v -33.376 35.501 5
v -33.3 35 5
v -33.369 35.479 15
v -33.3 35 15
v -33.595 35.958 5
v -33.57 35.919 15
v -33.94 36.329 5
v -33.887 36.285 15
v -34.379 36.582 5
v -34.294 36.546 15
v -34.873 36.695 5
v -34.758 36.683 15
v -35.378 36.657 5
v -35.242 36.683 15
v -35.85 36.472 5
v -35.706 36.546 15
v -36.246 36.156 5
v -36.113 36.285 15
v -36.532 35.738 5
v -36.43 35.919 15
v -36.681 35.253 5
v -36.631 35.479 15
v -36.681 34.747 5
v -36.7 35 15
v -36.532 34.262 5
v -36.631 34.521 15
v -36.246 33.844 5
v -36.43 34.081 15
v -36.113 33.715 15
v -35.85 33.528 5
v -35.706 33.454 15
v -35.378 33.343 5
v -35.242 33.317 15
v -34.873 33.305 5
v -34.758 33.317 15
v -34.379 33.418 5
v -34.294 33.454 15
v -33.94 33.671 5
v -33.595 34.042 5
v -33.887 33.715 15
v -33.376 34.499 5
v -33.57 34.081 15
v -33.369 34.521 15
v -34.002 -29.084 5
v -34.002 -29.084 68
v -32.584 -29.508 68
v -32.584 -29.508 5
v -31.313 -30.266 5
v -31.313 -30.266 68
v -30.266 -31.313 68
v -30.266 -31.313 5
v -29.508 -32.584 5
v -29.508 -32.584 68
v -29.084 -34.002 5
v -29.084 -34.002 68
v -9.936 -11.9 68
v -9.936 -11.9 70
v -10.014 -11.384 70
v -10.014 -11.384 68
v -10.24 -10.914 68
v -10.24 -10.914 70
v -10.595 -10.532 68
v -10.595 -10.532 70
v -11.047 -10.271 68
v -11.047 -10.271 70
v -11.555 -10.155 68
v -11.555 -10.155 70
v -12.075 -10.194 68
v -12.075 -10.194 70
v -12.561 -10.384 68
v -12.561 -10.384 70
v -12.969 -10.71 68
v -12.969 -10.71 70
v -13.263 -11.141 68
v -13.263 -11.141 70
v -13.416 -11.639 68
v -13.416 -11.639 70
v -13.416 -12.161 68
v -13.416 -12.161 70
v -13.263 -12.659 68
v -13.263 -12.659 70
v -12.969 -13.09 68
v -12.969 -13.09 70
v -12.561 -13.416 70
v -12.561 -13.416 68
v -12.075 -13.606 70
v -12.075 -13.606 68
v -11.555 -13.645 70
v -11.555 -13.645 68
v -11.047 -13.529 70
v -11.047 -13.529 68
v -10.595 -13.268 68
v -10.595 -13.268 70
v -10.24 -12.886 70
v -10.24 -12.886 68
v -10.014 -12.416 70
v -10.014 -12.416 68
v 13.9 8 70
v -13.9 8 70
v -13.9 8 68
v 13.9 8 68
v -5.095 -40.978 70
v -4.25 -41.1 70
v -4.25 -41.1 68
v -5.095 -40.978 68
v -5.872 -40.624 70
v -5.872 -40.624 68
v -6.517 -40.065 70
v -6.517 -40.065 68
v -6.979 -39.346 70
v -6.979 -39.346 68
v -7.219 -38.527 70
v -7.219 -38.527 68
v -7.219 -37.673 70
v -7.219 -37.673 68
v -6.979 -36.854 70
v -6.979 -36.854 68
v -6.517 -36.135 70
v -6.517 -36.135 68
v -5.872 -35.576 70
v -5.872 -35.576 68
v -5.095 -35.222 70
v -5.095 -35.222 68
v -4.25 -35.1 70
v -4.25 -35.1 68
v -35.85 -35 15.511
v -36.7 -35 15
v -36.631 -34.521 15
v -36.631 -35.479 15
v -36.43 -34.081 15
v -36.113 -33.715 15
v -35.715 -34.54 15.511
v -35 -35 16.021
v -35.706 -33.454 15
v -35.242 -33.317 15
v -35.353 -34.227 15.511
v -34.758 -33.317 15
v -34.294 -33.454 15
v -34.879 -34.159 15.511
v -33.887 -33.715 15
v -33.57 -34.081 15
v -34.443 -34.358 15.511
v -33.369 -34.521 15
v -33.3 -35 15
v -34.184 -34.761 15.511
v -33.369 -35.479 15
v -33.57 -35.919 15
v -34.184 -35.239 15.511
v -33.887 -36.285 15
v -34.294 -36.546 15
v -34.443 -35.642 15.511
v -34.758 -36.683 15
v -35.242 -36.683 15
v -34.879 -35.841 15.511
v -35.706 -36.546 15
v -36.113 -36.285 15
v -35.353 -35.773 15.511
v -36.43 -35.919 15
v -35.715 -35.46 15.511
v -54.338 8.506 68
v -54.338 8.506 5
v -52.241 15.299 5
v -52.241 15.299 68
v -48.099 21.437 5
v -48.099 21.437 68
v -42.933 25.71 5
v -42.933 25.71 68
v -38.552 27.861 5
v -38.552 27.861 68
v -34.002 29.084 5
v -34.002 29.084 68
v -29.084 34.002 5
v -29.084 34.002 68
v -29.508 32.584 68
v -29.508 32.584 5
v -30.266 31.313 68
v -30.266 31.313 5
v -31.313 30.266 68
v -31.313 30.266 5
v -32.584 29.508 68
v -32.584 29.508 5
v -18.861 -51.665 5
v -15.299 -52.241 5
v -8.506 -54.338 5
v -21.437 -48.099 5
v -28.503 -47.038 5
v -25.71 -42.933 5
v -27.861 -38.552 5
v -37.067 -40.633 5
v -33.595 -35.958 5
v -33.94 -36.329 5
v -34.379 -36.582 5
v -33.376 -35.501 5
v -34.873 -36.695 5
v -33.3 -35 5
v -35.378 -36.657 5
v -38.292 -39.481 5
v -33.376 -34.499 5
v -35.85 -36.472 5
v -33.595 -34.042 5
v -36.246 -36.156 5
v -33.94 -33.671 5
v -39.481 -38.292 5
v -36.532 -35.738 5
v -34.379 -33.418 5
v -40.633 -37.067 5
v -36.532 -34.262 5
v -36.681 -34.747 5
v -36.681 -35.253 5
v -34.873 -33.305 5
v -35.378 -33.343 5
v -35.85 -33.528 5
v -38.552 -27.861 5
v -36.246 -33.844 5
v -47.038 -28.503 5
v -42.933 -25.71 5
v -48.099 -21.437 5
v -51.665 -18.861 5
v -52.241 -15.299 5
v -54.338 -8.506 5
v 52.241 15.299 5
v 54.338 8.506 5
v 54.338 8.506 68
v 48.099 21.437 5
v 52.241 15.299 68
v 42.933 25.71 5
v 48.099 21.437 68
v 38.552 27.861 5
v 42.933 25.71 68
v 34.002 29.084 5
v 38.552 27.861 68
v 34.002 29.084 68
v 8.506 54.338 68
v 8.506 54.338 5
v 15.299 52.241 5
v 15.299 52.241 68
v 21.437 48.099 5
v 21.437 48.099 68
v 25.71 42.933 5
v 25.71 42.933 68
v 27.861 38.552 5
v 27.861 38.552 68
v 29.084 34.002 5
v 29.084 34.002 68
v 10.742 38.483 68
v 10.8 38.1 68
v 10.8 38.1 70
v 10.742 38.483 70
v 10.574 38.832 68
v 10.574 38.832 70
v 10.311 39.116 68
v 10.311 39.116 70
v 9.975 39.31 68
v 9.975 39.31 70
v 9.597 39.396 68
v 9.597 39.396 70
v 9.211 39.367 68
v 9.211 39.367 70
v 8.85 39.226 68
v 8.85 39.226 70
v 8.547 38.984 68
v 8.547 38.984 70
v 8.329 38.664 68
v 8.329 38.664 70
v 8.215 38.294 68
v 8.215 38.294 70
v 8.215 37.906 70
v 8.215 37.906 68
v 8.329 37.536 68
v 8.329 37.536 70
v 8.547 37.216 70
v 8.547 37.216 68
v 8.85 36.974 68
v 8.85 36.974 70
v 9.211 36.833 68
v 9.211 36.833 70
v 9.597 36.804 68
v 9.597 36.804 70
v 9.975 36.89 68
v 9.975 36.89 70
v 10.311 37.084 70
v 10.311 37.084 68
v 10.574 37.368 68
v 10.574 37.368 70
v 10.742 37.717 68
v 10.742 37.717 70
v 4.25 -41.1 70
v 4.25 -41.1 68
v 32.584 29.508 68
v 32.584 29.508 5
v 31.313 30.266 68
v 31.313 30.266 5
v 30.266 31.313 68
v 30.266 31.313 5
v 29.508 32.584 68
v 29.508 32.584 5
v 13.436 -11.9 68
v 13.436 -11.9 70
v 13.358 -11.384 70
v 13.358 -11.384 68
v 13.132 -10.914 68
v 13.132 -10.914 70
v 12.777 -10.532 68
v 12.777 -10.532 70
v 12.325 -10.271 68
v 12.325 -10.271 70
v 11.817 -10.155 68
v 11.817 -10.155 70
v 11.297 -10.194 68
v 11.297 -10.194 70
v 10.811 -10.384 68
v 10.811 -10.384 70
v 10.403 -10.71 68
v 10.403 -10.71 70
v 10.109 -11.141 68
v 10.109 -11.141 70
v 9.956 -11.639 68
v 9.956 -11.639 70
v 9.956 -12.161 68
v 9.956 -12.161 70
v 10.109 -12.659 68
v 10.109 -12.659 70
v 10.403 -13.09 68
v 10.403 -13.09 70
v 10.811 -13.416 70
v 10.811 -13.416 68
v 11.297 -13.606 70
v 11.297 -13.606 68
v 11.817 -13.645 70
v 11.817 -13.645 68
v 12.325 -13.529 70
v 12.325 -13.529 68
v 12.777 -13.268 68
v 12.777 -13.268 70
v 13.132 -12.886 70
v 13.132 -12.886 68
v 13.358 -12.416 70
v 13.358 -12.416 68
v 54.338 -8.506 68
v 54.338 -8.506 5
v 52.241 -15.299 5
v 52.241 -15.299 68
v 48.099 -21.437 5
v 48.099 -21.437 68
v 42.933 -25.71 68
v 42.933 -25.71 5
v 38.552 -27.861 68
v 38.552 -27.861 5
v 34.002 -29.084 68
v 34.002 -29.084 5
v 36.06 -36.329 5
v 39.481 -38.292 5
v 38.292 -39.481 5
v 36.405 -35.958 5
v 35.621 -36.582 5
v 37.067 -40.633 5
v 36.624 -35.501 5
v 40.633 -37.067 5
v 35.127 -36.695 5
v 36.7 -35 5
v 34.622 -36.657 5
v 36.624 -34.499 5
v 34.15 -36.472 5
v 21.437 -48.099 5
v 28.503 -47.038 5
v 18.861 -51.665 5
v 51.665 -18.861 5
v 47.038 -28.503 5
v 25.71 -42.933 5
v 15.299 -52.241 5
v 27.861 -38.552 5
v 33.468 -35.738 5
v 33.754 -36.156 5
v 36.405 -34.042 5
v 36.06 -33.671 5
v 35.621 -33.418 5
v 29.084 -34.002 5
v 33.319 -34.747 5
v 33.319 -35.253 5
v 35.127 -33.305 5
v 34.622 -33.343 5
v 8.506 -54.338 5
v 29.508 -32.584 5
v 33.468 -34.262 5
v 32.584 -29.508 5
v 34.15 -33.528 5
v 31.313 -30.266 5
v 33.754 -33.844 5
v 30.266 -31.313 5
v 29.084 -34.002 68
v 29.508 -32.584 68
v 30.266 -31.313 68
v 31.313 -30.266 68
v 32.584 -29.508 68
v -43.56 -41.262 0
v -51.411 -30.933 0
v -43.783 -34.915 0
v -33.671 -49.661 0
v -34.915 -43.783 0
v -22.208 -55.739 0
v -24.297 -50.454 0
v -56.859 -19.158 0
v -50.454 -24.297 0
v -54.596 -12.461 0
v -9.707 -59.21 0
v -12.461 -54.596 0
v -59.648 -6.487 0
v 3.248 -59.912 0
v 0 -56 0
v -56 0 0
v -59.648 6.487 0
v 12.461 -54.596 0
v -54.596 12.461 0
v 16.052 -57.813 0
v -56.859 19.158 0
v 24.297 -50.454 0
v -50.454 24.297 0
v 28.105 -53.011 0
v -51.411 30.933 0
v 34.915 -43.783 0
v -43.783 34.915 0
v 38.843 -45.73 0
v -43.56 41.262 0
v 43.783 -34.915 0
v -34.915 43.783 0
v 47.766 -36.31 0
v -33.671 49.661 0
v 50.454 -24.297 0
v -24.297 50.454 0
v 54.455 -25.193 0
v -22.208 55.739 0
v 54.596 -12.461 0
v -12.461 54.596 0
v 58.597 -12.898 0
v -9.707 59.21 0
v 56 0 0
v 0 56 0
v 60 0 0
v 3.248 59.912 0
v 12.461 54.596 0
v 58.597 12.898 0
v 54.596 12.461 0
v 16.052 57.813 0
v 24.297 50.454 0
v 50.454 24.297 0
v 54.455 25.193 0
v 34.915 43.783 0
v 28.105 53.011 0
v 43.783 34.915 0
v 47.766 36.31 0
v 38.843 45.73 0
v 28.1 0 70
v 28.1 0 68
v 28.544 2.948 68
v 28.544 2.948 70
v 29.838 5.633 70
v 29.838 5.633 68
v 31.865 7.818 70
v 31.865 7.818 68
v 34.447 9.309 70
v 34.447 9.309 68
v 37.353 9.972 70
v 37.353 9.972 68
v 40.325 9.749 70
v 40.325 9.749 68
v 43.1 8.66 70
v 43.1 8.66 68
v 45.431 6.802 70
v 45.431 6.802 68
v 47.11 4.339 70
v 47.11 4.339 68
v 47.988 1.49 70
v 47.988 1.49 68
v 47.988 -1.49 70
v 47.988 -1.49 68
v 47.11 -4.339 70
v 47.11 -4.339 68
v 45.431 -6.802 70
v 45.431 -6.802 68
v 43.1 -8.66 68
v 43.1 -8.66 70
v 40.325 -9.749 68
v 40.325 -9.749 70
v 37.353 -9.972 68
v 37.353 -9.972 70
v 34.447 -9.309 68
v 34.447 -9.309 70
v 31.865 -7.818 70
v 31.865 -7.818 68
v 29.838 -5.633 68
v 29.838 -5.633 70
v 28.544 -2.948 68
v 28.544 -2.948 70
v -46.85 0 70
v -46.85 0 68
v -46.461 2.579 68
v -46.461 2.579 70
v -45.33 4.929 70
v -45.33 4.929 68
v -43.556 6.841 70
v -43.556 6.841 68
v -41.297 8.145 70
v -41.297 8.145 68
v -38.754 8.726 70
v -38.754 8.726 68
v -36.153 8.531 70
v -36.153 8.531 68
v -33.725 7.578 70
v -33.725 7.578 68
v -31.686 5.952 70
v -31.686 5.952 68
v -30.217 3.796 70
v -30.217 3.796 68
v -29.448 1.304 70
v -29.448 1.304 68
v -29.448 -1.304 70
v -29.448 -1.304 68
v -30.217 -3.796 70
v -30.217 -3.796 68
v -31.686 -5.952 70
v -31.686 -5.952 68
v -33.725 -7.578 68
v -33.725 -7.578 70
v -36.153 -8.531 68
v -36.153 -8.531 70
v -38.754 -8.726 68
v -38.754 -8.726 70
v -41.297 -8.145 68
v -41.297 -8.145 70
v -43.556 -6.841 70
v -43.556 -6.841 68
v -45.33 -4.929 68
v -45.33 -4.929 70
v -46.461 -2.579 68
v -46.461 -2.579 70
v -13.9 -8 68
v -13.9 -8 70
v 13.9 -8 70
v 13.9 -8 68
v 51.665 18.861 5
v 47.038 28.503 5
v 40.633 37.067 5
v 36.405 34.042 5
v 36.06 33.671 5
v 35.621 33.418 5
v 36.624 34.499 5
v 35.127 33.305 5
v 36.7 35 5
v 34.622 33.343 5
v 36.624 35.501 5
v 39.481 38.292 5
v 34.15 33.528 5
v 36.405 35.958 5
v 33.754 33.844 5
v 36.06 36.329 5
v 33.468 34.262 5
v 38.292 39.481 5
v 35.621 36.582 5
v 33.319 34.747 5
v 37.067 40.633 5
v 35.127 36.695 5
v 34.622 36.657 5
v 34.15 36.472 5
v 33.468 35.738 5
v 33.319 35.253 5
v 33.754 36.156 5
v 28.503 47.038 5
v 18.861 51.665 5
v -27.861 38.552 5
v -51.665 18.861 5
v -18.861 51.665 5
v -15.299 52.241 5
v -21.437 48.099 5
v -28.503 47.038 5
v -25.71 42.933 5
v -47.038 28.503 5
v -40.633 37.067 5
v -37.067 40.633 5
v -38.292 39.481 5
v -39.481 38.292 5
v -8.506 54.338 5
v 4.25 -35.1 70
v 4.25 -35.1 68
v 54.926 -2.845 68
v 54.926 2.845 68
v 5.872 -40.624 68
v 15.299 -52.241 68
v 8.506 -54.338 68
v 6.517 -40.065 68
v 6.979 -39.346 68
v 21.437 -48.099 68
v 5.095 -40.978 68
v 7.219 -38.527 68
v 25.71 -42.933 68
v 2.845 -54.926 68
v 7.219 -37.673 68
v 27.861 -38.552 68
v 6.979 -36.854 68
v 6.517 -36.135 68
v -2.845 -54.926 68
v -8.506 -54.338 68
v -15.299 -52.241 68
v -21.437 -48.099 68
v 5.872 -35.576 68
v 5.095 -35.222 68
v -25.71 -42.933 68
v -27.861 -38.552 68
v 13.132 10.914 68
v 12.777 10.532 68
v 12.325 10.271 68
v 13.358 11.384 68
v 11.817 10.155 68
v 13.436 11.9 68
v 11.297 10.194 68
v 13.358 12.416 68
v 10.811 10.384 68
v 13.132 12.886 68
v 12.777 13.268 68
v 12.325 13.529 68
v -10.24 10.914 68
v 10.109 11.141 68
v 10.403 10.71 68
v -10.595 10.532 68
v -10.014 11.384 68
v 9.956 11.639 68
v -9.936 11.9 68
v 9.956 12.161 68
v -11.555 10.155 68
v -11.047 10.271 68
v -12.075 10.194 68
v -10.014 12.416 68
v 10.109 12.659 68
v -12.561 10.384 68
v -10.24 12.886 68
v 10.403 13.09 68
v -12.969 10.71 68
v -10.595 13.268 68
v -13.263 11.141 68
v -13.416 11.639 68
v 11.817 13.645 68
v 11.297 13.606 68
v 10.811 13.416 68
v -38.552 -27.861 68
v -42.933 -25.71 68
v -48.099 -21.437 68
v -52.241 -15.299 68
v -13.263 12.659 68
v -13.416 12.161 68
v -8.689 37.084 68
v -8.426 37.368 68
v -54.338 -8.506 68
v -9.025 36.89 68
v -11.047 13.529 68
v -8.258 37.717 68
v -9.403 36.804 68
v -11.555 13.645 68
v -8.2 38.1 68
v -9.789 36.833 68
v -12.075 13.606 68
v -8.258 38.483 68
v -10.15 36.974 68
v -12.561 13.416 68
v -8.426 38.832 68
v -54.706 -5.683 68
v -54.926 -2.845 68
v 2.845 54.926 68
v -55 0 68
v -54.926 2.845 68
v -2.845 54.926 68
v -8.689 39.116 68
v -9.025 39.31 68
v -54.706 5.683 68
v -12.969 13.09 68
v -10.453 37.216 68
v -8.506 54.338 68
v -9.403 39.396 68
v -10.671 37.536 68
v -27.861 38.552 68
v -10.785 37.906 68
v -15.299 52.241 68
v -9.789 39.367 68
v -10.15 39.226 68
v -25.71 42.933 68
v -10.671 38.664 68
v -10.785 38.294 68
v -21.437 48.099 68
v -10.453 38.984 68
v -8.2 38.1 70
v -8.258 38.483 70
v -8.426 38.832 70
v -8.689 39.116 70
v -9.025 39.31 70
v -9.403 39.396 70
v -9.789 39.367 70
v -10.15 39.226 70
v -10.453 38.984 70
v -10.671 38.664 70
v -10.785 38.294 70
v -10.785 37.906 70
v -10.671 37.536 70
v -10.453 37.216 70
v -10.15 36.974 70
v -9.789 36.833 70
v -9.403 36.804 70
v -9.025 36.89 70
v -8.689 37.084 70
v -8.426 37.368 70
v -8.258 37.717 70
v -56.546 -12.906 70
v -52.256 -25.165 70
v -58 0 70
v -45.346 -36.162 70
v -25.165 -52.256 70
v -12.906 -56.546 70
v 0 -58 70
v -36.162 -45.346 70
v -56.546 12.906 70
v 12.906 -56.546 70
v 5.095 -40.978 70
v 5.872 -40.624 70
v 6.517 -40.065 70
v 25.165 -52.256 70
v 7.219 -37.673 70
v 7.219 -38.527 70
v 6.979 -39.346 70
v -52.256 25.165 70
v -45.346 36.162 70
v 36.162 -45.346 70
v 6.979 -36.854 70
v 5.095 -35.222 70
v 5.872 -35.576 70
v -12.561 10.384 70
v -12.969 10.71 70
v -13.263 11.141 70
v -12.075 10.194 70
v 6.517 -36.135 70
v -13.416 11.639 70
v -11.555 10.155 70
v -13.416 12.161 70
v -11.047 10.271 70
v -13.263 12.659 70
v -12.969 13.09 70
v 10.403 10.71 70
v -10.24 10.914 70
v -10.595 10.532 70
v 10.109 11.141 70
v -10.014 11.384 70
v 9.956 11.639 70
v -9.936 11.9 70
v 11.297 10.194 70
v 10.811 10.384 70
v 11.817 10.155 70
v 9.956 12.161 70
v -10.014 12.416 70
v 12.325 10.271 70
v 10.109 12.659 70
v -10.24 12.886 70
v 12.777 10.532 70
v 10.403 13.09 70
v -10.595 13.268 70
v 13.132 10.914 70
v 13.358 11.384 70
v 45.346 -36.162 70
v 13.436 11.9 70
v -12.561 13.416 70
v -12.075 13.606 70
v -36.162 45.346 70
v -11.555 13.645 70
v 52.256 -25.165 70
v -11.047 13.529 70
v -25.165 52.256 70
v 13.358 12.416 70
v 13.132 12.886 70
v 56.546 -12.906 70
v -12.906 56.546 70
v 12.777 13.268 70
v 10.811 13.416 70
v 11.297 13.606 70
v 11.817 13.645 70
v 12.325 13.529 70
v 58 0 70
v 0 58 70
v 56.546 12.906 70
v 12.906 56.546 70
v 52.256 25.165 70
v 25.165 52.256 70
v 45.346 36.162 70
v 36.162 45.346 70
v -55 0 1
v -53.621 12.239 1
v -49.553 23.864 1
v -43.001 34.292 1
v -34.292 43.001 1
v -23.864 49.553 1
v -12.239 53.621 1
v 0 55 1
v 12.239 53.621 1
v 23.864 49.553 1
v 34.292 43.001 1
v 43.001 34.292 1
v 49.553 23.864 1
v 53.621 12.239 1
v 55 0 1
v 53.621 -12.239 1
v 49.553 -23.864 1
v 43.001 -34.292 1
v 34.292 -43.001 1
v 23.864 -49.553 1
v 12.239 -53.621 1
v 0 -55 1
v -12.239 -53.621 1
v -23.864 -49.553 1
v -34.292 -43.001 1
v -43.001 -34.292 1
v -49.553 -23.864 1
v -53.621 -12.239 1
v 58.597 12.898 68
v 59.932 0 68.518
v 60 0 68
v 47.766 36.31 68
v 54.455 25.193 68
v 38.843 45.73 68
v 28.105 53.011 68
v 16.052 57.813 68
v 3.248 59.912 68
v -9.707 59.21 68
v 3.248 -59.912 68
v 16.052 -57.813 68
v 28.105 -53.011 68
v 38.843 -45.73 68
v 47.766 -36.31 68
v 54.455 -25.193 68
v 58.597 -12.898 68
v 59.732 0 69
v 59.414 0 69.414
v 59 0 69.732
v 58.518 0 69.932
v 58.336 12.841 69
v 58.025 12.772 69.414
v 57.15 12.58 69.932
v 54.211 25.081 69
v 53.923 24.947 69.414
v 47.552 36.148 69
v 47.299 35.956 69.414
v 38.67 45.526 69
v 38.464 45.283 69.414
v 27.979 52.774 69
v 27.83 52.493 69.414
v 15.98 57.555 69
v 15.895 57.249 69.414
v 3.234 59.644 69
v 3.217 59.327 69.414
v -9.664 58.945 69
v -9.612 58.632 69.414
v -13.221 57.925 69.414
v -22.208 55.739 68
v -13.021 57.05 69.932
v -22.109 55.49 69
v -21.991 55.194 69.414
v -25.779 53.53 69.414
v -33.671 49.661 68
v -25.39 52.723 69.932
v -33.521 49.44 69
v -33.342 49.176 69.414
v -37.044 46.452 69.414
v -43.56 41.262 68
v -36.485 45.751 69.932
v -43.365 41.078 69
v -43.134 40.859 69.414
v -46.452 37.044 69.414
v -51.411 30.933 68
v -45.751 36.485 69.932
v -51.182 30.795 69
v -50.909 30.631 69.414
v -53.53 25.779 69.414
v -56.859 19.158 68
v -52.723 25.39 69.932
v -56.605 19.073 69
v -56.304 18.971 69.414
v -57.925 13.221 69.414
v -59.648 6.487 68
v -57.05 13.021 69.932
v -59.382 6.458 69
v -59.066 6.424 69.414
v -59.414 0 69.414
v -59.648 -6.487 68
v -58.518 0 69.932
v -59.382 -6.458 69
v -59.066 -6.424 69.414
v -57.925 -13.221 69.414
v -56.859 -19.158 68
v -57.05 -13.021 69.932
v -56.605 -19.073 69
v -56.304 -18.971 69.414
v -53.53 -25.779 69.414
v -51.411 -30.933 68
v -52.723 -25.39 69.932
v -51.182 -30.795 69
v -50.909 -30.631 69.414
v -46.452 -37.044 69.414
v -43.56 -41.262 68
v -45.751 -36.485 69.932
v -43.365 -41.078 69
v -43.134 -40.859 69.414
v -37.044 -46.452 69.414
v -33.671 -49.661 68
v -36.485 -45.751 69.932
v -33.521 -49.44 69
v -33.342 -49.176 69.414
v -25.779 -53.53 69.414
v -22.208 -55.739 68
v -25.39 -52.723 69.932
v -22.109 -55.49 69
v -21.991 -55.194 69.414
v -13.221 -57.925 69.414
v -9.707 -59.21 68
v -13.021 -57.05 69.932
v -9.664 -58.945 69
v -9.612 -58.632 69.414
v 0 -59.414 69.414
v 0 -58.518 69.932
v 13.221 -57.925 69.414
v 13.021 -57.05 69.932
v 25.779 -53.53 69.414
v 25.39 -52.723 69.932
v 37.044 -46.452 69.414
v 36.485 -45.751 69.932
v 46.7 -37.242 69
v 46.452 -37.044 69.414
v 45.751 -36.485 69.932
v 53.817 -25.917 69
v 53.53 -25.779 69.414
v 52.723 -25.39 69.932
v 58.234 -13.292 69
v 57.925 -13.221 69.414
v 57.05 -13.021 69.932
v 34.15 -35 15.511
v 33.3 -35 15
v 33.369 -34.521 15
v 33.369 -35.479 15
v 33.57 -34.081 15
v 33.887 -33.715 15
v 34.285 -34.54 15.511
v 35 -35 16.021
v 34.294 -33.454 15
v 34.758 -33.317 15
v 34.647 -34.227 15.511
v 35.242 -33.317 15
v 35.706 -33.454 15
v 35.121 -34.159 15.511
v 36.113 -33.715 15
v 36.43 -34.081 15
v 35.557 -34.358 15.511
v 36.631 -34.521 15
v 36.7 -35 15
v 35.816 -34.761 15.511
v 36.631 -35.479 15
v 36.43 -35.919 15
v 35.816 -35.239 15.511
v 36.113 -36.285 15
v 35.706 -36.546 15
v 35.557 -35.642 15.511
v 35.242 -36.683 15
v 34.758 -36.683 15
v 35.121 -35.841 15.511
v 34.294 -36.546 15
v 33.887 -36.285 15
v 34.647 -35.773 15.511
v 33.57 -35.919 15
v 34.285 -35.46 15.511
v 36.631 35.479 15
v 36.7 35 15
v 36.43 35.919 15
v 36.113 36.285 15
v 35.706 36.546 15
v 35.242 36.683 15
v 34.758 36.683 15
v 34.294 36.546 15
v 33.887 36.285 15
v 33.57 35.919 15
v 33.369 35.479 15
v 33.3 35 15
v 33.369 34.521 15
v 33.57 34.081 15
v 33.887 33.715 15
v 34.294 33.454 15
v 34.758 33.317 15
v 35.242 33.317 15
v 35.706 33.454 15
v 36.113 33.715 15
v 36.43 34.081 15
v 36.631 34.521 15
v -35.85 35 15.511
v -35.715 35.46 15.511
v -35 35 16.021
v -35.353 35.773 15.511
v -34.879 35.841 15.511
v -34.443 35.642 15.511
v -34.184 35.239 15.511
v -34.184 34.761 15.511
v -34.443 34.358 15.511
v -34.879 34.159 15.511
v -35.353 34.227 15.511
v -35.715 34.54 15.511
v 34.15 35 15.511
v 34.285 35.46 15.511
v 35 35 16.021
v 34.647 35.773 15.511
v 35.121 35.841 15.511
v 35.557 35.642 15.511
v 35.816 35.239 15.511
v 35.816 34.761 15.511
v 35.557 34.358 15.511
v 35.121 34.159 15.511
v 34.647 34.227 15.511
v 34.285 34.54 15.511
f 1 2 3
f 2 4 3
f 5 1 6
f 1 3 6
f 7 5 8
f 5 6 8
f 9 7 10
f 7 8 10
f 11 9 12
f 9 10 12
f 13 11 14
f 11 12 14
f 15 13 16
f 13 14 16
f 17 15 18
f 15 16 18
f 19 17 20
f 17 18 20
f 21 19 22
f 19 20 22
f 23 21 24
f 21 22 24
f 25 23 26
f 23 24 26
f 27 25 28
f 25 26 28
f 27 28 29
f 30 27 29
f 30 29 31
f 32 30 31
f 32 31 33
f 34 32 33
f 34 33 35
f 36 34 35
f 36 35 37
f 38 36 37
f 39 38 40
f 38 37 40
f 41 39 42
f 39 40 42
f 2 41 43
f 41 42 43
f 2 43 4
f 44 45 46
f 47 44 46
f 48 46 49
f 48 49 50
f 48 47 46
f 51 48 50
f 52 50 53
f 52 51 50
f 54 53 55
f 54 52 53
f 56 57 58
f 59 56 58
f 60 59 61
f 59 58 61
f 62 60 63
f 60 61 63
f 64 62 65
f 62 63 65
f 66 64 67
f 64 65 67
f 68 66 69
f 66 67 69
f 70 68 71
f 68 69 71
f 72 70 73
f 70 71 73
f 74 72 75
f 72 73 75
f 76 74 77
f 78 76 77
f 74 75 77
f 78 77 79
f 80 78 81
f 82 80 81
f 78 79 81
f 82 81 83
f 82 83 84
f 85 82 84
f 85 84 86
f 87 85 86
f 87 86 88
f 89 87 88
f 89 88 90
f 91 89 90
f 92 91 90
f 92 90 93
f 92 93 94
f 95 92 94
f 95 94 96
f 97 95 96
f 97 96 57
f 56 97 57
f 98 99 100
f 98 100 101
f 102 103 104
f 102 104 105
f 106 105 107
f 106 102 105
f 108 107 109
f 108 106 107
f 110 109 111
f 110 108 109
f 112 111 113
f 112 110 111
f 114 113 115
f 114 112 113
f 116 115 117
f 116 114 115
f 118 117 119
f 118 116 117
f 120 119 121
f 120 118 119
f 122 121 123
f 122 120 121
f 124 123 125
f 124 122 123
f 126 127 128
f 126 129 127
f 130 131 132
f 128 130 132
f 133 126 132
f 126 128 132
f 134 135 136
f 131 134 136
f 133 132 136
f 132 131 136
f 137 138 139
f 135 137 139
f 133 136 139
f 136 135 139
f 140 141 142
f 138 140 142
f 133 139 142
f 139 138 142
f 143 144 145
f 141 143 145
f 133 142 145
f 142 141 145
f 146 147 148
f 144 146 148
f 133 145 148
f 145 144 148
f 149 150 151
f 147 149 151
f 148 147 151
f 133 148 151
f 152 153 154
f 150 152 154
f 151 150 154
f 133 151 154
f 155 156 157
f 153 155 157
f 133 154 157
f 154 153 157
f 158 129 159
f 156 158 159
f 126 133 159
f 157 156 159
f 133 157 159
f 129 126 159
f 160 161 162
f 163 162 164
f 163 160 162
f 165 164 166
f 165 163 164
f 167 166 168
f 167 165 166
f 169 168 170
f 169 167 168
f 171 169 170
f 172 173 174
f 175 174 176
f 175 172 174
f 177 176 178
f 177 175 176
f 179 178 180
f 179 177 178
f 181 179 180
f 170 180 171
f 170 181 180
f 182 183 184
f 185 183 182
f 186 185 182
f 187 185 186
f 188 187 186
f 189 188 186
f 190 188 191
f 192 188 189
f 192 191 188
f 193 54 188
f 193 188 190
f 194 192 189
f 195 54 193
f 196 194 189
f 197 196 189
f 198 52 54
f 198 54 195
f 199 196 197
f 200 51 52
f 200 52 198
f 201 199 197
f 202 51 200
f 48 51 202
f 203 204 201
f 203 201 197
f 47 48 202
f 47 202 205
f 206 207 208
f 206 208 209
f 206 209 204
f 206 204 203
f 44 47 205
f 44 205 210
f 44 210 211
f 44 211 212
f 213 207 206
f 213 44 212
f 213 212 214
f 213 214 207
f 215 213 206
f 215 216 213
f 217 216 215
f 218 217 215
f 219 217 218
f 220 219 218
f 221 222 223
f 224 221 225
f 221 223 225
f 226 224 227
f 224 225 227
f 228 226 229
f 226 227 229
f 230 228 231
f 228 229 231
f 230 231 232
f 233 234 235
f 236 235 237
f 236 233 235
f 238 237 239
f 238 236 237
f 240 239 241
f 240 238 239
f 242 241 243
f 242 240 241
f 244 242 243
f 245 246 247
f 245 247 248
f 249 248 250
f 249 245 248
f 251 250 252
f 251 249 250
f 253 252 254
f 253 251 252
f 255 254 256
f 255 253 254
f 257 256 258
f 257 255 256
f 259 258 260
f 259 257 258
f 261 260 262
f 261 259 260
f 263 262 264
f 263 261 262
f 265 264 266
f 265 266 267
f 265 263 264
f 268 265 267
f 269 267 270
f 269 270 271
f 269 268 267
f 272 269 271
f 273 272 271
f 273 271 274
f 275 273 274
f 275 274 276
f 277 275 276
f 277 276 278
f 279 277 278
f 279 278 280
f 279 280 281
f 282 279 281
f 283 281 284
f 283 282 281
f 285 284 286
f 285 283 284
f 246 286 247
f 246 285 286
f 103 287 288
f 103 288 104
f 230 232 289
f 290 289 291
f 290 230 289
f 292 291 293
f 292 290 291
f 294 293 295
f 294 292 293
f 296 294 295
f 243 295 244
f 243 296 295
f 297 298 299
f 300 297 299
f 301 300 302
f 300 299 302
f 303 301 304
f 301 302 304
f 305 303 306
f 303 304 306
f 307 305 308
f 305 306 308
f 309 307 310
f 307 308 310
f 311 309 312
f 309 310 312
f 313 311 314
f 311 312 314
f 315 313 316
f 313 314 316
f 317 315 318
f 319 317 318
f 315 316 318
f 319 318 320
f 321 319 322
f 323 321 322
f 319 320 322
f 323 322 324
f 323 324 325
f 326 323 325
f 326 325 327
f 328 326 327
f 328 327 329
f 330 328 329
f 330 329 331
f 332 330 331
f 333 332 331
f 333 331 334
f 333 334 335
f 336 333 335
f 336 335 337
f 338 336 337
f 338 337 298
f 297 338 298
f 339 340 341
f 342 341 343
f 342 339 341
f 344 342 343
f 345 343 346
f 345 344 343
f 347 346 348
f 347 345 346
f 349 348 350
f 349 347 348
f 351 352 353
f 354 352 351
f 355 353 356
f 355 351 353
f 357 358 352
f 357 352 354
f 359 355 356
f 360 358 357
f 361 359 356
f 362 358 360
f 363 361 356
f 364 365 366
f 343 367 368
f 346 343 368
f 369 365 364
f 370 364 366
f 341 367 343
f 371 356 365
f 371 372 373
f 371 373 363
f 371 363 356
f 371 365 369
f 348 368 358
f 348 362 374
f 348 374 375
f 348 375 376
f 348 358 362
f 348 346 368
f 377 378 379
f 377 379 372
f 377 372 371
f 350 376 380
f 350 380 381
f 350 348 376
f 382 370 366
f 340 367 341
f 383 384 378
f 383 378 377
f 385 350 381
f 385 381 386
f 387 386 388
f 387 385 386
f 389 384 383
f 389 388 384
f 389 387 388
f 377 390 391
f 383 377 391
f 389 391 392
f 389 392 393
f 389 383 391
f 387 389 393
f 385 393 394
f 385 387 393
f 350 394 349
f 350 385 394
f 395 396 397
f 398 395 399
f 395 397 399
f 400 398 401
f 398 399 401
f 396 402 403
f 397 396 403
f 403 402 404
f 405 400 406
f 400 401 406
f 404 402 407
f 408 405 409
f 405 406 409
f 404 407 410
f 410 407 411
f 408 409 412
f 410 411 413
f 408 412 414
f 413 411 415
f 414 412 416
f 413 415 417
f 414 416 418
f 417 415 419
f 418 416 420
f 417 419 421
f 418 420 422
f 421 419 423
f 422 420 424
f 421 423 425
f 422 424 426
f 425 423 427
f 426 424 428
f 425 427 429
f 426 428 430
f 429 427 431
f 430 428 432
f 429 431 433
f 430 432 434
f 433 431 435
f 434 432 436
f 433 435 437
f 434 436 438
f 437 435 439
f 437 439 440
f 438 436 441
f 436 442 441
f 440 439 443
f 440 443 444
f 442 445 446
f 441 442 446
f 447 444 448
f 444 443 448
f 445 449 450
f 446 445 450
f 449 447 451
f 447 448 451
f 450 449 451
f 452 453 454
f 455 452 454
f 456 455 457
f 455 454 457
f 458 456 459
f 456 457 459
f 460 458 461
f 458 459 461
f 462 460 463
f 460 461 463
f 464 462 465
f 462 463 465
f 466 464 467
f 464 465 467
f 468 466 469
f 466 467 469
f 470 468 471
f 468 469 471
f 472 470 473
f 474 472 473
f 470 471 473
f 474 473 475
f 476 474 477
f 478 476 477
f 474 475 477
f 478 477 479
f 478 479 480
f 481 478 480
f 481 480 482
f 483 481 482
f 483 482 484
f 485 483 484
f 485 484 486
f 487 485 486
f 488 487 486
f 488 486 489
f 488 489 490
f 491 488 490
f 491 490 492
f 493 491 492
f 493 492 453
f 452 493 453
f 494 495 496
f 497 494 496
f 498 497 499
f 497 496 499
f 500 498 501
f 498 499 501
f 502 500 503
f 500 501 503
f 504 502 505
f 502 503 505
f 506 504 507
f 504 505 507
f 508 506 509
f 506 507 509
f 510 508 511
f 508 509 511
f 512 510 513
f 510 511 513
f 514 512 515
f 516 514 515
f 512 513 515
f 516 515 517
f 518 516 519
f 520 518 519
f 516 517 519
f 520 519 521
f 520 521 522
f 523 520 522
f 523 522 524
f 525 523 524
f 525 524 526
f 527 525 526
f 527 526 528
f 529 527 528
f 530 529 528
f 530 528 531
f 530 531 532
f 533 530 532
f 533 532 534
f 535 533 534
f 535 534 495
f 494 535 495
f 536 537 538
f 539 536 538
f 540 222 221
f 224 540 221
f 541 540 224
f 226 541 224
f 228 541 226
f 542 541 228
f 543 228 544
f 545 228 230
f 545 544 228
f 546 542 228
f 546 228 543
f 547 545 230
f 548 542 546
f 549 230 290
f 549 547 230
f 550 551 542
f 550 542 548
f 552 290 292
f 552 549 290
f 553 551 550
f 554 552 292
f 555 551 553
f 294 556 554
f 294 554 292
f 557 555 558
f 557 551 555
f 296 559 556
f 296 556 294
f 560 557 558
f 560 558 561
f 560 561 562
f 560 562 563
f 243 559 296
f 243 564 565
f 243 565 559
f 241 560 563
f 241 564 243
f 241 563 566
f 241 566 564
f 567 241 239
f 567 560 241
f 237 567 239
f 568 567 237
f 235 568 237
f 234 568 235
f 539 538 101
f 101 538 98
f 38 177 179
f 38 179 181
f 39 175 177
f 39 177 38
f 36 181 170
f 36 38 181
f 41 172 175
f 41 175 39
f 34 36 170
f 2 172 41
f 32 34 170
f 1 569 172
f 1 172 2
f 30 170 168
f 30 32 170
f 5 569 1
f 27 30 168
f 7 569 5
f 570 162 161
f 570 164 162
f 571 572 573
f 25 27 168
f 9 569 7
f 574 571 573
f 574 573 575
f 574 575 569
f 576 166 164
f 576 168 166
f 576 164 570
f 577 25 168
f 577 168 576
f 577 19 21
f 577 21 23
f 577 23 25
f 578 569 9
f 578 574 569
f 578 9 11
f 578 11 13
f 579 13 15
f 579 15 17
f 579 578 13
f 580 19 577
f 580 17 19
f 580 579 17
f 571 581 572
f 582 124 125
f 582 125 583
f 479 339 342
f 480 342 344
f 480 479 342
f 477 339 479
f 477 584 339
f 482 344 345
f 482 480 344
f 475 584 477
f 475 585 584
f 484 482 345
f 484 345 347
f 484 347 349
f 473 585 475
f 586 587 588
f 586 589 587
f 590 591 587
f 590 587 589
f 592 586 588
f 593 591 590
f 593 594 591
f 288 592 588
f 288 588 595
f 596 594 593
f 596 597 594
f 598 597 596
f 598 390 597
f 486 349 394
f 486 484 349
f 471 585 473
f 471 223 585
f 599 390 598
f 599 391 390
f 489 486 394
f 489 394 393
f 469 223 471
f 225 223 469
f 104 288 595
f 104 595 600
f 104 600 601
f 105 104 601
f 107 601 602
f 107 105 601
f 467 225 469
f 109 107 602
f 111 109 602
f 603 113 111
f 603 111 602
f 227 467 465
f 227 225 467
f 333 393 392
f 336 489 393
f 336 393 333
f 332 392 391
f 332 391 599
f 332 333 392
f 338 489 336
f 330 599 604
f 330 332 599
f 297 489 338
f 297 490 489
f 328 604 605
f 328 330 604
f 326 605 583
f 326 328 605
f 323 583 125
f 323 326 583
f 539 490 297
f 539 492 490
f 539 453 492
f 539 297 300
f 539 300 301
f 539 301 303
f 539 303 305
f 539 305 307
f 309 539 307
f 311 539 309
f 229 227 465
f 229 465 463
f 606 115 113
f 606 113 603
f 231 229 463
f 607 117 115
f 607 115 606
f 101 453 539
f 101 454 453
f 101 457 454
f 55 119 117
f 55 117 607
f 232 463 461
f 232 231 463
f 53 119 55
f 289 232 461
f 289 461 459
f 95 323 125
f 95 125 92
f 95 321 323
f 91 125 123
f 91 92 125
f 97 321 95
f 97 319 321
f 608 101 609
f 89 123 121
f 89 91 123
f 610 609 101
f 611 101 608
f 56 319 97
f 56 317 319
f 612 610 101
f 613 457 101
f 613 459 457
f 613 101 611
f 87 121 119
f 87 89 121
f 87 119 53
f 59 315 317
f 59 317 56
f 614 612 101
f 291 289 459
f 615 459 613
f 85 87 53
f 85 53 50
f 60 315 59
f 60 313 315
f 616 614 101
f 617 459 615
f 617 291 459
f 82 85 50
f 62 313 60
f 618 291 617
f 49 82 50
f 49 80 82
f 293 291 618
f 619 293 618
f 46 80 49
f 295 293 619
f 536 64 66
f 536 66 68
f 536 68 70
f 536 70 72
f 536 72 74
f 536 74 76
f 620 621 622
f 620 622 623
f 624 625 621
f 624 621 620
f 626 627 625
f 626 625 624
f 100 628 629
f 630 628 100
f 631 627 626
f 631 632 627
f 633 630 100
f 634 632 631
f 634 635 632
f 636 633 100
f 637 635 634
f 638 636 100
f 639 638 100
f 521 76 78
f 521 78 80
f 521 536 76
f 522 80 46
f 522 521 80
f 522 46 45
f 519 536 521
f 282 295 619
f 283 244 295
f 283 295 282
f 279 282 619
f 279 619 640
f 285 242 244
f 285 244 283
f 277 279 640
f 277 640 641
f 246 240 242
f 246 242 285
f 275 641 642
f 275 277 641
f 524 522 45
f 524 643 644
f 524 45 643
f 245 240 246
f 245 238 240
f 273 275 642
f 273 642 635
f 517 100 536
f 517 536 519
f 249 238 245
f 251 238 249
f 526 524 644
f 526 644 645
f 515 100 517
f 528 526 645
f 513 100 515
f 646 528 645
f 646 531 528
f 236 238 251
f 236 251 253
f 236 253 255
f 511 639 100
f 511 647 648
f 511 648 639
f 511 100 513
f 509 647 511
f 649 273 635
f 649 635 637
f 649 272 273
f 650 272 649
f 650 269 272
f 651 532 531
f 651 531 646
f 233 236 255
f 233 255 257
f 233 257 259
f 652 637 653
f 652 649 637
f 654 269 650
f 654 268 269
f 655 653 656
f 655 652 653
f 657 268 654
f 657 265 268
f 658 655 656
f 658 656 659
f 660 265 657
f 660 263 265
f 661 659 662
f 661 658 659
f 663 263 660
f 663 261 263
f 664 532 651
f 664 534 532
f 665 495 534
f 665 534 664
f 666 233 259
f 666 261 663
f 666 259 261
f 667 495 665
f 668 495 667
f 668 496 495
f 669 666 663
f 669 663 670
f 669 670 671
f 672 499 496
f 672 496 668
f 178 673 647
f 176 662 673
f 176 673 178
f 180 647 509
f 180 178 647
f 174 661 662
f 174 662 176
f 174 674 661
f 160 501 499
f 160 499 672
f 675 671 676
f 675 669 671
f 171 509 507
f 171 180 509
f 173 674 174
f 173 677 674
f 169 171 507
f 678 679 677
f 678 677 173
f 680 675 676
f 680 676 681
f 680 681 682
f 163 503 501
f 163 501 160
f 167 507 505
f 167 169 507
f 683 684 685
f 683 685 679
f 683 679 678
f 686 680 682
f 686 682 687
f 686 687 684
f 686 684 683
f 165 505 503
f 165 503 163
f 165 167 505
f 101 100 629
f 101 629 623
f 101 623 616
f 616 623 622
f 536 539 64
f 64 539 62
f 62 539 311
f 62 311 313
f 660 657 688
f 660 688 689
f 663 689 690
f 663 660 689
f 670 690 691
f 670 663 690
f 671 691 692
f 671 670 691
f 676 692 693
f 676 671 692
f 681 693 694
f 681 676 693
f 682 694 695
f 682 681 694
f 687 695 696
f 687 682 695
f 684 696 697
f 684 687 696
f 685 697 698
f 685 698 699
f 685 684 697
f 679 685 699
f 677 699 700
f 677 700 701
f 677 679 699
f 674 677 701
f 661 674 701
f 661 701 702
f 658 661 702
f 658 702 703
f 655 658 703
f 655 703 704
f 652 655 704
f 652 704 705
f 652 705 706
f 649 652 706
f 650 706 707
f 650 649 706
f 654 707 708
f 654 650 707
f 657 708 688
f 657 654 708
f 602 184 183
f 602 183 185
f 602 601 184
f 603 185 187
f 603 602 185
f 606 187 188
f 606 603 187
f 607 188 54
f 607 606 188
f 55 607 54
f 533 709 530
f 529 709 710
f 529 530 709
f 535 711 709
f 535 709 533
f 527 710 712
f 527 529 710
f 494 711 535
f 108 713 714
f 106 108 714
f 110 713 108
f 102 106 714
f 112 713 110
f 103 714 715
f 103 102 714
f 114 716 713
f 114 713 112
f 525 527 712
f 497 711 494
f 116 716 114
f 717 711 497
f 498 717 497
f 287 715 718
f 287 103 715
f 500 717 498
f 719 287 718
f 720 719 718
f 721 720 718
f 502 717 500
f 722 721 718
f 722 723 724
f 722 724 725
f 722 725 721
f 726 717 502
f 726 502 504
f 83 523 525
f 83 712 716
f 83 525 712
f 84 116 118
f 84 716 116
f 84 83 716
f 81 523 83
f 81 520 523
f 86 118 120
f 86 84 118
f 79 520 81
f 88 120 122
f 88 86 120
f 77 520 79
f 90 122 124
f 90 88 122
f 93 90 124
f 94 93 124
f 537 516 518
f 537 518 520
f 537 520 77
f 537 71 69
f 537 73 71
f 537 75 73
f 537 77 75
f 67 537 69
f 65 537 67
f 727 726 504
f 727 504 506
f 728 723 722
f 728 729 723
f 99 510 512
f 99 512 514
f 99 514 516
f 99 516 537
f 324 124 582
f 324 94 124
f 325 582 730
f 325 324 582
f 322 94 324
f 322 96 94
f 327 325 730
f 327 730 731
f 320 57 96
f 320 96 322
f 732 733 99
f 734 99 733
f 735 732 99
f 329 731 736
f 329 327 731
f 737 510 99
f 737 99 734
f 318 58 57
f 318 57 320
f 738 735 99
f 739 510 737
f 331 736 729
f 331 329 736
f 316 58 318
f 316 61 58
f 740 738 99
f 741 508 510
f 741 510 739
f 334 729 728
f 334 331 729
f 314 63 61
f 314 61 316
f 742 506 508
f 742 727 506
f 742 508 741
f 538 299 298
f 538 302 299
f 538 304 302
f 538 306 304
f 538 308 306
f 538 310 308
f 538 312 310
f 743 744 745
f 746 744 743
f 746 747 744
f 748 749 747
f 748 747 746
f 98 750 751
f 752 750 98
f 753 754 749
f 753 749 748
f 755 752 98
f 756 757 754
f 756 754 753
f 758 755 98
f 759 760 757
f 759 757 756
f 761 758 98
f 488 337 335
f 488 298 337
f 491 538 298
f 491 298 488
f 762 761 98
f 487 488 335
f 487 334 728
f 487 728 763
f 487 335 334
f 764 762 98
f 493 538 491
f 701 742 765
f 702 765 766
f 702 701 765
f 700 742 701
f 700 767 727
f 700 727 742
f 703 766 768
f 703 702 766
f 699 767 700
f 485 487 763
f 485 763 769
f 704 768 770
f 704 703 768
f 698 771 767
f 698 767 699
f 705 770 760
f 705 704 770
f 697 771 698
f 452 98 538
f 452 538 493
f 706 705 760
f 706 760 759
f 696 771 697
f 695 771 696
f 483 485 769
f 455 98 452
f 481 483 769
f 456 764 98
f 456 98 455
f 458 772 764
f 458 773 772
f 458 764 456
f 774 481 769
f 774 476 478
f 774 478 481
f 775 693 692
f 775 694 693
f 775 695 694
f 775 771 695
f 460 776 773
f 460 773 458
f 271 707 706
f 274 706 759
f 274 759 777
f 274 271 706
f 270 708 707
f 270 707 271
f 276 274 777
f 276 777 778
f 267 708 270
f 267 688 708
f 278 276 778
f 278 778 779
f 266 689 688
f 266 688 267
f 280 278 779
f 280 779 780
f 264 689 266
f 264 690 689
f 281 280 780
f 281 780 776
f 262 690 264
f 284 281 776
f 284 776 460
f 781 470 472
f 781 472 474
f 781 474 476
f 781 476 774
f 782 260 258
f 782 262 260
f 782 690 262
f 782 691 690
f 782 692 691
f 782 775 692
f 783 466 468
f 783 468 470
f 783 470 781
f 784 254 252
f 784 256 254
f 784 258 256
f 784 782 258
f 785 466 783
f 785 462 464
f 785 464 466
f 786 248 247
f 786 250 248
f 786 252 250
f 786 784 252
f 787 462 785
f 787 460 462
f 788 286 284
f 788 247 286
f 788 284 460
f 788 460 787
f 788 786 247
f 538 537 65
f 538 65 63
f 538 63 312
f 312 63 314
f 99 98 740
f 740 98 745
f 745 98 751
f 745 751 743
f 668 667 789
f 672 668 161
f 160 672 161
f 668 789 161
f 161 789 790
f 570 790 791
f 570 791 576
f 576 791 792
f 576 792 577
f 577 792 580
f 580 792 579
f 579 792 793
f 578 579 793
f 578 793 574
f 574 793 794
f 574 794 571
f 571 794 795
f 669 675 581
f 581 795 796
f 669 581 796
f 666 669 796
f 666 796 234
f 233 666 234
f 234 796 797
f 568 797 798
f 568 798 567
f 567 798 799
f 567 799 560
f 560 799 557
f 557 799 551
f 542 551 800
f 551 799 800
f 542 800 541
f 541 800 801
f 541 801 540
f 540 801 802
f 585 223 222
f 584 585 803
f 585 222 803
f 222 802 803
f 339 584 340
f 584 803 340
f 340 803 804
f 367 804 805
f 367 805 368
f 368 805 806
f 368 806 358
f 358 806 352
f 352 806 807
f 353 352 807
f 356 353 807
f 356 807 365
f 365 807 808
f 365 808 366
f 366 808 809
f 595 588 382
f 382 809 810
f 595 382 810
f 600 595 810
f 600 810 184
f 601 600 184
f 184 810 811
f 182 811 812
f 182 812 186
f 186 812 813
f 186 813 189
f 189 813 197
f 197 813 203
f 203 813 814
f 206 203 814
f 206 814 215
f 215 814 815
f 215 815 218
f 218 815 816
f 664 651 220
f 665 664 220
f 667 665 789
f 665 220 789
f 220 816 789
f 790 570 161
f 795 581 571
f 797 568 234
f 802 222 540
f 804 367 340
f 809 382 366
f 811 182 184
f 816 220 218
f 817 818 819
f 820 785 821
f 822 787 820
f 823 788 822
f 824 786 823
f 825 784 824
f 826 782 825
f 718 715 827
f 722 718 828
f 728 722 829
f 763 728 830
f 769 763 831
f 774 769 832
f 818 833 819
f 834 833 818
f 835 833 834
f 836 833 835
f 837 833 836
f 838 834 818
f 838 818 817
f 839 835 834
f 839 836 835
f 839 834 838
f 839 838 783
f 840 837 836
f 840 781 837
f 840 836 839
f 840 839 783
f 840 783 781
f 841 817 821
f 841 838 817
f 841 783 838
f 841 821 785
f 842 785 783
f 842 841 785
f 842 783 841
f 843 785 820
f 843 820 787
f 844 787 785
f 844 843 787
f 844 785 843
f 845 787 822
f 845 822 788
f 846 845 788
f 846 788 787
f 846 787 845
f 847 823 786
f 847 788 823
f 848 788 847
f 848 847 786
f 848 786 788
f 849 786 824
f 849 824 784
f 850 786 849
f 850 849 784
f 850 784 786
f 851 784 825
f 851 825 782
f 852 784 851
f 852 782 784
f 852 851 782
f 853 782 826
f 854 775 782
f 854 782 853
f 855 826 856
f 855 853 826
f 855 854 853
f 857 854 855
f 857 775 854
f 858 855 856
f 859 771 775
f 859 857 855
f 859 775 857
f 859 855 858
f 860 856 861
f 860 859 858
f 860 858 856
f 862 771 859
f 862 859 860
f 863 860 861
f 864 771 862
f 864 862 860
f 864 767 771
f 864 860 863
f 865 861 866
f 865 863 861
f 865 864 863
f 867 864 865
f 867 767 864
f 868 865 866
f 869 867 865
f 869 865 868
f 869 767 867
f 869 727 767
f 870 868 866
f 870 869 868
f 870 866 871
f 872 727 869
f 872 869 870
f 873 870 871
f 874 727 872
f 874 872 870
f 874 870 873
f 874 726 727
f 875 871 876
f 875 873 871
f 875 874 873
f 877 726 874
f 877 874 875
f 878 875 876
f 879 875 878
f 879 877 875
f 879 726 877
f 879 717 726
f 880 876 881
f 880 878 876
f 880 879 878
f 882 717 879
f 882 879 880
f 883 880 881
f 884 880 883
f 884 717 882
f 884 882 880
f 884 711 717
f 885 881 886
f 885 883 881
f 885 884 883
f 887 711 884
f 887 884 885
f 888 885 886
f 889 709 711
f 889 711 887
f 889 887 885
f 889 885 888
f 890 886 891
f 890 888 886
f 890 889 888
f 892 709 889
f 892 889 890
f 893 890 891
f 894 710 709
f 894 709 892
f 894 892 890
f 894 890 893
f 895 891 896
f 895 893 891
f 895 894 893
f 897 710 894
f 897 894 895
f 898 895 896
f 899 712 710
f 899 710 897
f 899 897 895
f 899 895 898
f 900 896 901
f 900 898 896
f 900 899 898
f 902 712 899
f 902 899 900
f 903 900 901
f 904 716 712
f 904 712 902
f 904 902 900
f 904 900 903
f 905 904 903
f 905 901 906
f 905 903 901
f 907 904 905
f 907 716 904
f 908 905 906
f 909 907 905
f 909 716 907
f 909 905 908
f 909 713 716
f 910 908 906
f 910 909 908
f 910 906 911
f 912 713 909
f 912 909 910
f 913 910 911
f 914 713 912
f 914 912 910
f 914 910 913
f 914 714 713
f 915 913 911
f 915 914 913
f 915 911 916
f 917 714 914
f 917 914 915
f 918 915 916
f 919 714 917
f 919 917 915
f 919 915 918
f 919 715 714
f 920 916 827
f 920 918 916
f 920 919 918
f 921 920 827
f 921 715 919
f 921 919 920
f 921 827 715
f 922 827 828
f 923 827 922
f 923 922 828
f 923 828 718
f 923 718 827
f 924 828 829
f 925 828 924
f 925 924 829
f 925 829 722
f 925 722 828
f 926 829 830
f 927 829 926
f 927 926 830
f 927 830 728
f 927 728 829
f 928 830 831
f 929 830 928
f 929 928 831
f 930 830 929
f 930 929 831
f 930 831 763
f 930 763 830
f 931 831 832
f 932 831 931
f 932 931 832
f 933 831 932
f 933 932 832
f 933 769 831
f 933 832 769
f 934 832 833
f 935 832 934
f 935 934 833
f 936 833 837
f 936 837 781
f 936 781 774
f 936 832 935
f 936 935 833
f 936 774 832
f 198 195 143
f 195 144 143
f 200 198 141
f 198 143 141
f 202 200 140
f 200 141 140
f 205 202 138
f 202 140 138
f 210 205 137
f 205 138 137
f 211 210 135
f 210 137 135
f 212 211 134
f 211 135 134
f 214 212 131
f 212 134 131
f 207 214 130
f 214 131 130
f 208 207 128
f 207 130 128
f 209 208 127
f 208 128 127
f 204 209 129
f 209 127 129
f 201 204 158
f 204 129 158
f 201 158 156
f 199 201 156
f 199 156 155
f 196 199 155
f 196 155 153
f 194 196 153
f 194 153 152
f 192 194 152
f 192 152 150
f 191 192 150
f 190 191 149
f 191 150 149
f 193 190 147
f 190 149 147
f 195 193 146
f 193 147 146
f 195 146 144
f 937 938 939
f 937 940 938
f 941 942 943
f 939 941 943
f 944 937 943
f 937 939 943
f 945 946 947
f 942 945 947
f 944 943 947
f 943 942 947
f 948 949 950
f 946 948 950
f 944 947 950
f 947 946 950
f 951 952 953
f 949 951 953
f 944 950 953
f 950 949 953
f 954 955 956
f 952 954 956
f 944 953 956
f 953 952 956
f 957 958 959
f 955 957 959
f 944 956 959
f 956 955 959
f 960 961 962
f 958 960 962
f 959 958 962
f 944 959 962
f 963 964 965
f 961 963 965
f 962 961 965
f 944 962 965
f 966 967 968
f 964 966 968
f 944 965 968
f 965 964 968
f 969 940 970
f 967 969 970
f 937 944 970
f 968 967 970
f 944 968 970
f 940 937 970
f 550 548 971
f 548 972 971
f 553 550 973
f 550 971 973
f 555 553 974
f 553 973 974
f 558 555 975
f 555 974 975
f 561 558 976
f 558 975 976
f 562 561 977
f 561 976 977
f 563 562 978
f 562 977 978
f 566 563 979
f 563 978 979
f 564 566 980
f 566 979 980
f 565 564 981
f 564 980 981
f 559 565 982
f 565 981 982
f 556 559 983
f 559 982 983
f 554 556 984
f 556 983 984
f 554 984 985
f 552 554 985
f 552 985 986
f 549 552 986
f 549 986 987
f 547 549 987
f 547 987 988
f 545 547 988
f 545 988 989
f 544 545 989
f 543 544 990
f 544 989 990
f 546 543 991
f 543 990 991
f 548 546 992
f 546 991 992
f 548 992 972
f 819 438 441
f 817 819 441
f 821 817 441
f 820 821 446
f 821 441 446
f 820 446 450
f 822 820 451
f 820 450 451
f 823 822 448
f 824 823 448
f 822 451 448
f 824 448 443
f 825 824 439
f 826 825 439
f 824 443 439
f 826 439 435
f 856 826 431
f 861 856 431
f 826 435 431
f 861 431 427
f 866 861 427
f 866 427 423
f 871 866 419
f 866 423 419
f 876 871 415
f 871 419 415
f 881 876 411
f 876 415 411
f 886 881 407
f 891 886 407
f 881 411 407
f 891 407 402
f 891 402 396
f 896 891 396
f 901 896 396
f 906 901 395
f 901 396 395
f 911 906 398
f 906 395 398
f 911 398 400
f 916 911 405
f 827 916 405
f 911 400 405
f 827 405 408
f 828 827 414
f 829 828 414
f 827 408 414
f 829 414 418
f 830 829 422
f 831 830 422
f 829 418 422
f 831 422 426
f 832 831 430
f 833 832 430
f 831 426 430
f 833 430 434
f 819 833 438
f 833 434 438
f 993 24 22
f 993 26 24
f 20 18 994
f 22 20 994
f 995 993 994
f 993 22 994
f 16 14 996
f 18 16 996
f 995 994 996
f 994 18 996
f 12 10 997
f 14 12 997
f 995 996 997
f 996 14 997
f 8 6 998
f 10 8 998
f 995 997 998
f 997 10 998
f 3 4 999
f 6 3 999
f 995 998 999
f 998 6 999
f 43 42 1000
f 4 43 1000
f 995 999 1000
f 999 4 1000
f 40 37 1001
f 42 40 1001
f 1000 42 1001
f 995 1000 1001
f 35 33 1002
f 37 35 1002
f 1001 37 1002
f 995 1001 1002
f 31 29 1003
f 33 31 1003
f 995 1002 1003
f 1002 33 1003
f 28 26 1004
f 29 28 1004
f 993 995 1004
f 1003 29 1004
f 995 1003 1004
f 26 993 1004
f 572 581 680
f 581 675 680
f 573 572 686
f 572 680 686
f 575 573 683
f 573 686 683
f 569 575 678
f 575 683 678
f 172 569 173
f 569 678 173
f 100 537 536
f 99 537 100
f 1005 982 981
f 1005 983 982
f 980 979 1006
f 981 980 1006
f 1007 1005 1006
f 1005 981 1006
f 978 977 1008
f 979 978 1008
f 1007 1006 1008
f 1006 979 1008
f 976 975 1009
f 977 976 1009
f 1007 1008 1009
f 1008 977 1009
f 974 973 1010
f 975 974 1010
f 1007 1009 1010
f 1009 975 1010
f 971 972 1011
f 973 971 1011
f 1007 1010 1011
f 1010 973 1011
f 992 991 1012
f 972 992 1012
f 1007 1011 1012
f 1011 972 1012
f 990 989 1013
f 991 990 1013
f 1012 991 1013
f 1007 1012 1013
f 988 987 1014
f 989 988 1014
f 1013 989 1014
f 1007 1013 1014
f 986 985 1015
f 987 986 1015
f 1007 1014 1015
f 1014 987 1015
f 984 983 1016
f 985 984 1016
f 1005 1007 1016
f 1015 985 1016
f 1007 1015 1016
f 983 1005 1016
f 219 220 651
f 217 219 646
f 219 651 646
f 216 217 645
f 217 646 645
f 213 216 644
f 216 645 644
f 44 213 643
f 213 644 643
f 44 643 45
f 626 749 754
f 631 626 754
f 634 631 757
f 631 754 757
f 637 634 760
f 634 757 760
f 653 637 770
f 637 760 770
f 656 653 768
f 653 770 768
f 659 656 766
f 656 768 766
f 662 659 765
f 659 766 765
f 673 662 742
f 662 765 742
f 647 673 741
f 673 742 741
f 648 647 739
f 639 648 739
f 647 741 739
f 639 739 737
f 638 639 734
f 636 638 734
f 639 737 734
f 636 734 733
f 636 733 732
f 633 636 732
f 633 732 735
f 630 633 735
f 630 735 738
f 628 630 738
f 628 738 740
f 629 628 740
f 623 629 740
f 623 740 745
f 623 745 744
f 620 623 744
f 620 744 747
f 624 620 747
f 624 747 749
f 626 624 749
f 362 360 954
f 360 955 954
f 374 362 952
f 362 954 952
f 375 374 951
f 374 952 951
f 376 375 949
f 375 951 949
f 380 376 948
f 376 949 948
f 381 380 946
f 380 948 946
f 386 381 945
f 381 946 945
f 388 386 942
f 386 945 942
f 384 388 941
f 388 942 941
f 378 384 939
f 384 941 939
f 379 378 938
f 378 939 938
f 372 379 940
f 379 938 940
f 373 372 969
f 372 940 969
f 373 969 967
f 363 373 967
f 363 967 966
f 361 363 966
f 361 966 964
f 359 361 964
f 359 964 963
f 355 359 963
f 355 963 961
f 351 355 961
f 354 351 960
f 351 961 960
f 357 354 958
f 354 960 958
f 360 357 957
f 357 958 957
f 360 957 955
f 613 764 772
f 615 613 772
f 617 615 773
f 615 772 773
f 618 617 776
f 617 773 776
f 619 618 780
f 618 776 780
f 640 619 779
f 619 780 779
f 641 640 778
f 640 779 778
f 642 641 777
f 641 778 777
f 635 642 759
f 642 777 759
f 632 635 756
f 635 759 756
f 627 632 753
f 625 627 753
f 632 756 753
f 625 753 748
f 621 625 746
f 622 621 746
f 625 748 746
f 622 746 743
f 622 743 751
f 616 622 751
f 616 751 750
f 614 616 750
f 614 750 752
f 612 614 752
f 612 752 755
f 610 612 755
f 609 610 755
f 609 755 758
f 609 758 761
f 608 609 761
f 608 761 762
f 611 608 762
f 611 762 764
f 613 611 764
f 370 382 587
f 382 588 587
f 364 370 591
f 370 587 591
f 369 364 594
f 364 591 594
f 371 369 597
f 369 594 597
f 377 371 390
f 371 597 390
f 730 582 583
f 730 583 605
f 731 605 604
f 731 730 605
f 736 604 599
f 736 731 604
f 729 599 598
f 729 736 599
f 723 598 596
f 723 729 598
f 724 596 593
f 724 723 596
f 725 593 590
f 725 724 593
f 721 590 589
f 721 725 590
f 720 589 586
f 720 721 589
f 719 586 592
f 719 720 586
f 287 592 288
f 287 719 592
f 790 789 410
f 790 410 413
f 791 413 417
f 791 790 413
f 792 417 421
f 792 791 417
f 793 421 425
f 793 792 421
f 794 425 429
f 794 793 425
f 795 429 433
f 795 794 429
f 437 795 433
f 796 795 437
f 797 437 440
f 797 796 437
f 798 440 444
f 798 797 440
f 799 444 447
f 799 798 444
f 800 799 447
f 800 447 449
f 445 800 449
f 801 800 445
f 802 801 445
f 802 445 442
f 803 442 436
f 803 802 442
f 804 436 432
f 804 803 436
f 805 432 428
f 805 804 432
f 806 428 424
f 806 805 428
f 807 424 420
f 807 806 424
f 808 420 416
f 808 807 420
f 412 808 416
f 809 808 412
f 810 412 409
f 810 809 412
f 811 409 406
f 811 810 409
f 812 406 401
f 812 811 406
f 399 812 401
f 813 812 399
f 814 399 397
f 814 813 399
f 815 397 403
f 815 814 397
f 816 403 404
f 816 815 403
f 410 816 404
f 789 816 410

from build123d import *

# Parameters (mm, degrees)
SKETCH1_R                    = 60
BOSS_EXTRUDE1_DEPTH          = 70
FILLET2_R                    = 2
SKETCH3_R                    = 55
CUT_EXTRUDE3_DEPTH           = 68
CHAMFER1_SIZE                = 1
BOSS_EXTRUDE3_DEPTH          = 63
FILLET5_R                    = 24.75
M3_CLEARANCE_HOLE1_D         = 3.4
M3_CLEARANCE_HOLE1_DEPTH     = 10
M3_CLEARANCE_HOLE1_TIP       = 1.021463052
M22_CLEARANCE_HOLE1_D        = 20
M18_CLEARANCE_HOLE1_D        = 17.5
SKETCH19_R                   = 1.75
SKETCH19_W                   = 27.8
SKETCH19_H                   = 16
CUT_EXTRUDE4_DEPTH           = 111
CUT_EXTRUDE8_DEPTH           = 111
M2_START                     = 68
M2_CLEARANCE_HOLE1_OUTLINE_R = 1.3
M2_CLEARANCE_HOLE1_DEPTH     = 2


# Read off the part's stored shape, not the designer's step: M2 Clearance Hole1
with BuildPart() as part:
    # Sketch1 → Boss-Extrude1 (new body)
    with BuildSketch(Plane.XY):
        Circle(SKETCH1_R)
    extrude(amount=BOSS_EXTRUDE1_DEPTH)

    # Fillet2
    fillet2_edges = [part.edges().sort_by_distance(p)[0] for p in [
        (-60, 0, 70),
    ]]
    fillet(fillet2_edges, radius=FILLET2_R)

    # Sketch3 → Cut-Extrude3 (cut)
    with BuildSketch(Plane(origin=(0, 0, 0), x_dir=(-1, 0, 0), z_dir=(0, 0, -1))):
        Circle(SKETCH3_R)
    extrude(amount=-CUT_EXTRUDE3_DEPTH, mode=Mode.SUBTRACT)

    # Chamfer1
    chamfer1_edges = [part.edges().sort_by_distance(p)[0] for p in [
        (55, 0, 0),
    ]]
    chamfer(chamfer1_edges, length=CHAMFER1_SIZE)

    # Sketch9 → Boss-Extrude3 (add)
    with BuildSketch(Plane(origin=(0, 0, 5), x_dir=(-1, 0, 0), z_dir=(0, 0, -1))):
        with BuildLine():
            ThreePointArc((-37.067445653, 40.632554347), (-38.890872965, 38.890872965), (-40.632554347, 37.067445653))
            ThreePointArc((-40.632554347, 37.067445653), (-30.757359313, 30.757359313), (-37.067445653, 40.632554347))
        make_face()
        with BuildLine():
            ThreePointArc((-37.067445653, -40.632554347), (-30.757359313, -30.757359313), (-40.632554347, -37.067445653))
            ThreePointArc((-40.632554347, -37.067445653), (-38.890872965, -38.890872965), (-37.067445653, -40.632554347))
        make_face()
        with BuildLine():
            ThreePointArc((37.067445653, 40.632554347), (30.757359313, 30.757359313), (40.632554347, 37.067445653))
            ThreePointArc((40.632554347, 37.067445653), (38.890872965, 38.890872965), (37.067445653, 40.632554347))
        make_face()
        with BuildLine():
            ThreePointArc((40.632554347, -37.067445653), (30.757359313, -30.757359313), (37.067445653, -40.632554347))
            ThreePointArc((37.067445653, -40.632554347), (38.890872965, -38.890872965), (40.632554347, -37.067445653))
        make_face()
    extrude(amount=-BOSS_EXTRUDE3_DEPTH)

    # Fillet5
    fillet5_edges = [part.edges().sort_by_distance(p)[0] for p in [
        (37.067445653, -40.632554347, 36.5),
        (40.632554347, -37.067445653, 36.5),
        (-37.067445653, 40.632554347, 36.5),
        (-40.632554347, 37.067445653, 36.5),
        (-40.632554347, -37.067445653, 36.5),
        (-37.067445653, -40.632554347, 36.5),
        (37.067445653, 40.632554347, 36.5),
        (40.632554347, 37.067445653, 36.5),
    ]]
    fillet(fillet5_edges, radius=FILLET5_R)

    # M3 Clearance Hole1
    with Locations(Plane(origin=(0, 0, 5), x_dir=(-1, 0, 0), z_dir=(0, 0, -1))):
        with Locations((-35, -35), (0, 0), (-35, 35), (35, -35), (35, 35)):
            Hole(M3_CLEARANCE_HOLE1_D / 2, depth=M3_CLEARANCE_HOLE1_DEPTH)
            with Locations((0, 0, -(M3_CLEARANCE_HOLE1_DEPTH + M3_CLEARANCE_HOLE1_TIP / 2))):  # 118° drill point
                Cone(0, M3_CLEARANCE_HOLE1_D / 2, M3_CLEARANCE_HOLE1_TIP, mode=Mode.SUBTRACT)

    # M22 Clearance Hole1 (through all)
    with Locations(Plane.XY.offset(70)):
        with Locations((38.1, 0)):
            Hole(M22_CLEARANCE_HOLE1_D / 2)

    # M18 Clearance Hole1 (through all)
    with Locations(Plane.XY.offset(70)):
        with Locations((-38.1, 0)):
            Hole(M18_CLEARANCE_HOLE1_D / 2)

    # Sketch19 → Cut-Extrude4 (cut, through all)
    with BuildSketch(Plane.XY.offset(70)):
        with Locations((-11.685971223, 11.9)):
            Circle(SKETCH19_R)
        with Locations((11.685971223, 11.9)):
            Circle(SKETCH19_R)
        with Locations((11.685971223, -11.9)):
            Circle(SKETCH19_R)
        with Locations((-11.685971223, -11.9)):
            Circle(SKETCH19_R)
        Rectangle(SKETCH19_W, SKETCH19_H)
    extrude(amount=-CUT_EXTRUDE4_DEPTH, mode=Mode.SUBTRACT)

    # Sketch25 → Cut-Extrude8 (cut, through all)
    with BuildSketch(Plane.XY.offset(70)):
        with BuildLine():
            Line((-4.25, -35.1), (4.25, -35.1))
            ThreePointArc((4.25, -35.1), (7.25, -38.1), (4.25, -41.1))
            Line((4.25, -41.1), (-4.25, -41.1))
            ThreePointArc((-4.25, -41.1), (-7.25, -38.1), (-4.25, -35.1))
        make_face()
    extrude(amount=-CUT_EXTRUDE8_DEPTH, mode=Mode.SUBTRACT)

    # M2 Clearance Hole1 outline → M2 Clearance Hole1 (cut)
    with BuildSketch(Plane.XY.offset(M2_START)):
        with Locations((-9.5, 38.1)):
            Circle(M2_CLEARANCE_HOLE1_OUTLINE_R)
        with Locations((9.5, 38.1)):
            Circle(M2_CLEARANCE_HOLE1_OUTLINE_R)
    extrude(amount=M2_CLEARANCE_HOLE1_DEPTH, mode=Mode.SUBTRACT)


solid = part.part
